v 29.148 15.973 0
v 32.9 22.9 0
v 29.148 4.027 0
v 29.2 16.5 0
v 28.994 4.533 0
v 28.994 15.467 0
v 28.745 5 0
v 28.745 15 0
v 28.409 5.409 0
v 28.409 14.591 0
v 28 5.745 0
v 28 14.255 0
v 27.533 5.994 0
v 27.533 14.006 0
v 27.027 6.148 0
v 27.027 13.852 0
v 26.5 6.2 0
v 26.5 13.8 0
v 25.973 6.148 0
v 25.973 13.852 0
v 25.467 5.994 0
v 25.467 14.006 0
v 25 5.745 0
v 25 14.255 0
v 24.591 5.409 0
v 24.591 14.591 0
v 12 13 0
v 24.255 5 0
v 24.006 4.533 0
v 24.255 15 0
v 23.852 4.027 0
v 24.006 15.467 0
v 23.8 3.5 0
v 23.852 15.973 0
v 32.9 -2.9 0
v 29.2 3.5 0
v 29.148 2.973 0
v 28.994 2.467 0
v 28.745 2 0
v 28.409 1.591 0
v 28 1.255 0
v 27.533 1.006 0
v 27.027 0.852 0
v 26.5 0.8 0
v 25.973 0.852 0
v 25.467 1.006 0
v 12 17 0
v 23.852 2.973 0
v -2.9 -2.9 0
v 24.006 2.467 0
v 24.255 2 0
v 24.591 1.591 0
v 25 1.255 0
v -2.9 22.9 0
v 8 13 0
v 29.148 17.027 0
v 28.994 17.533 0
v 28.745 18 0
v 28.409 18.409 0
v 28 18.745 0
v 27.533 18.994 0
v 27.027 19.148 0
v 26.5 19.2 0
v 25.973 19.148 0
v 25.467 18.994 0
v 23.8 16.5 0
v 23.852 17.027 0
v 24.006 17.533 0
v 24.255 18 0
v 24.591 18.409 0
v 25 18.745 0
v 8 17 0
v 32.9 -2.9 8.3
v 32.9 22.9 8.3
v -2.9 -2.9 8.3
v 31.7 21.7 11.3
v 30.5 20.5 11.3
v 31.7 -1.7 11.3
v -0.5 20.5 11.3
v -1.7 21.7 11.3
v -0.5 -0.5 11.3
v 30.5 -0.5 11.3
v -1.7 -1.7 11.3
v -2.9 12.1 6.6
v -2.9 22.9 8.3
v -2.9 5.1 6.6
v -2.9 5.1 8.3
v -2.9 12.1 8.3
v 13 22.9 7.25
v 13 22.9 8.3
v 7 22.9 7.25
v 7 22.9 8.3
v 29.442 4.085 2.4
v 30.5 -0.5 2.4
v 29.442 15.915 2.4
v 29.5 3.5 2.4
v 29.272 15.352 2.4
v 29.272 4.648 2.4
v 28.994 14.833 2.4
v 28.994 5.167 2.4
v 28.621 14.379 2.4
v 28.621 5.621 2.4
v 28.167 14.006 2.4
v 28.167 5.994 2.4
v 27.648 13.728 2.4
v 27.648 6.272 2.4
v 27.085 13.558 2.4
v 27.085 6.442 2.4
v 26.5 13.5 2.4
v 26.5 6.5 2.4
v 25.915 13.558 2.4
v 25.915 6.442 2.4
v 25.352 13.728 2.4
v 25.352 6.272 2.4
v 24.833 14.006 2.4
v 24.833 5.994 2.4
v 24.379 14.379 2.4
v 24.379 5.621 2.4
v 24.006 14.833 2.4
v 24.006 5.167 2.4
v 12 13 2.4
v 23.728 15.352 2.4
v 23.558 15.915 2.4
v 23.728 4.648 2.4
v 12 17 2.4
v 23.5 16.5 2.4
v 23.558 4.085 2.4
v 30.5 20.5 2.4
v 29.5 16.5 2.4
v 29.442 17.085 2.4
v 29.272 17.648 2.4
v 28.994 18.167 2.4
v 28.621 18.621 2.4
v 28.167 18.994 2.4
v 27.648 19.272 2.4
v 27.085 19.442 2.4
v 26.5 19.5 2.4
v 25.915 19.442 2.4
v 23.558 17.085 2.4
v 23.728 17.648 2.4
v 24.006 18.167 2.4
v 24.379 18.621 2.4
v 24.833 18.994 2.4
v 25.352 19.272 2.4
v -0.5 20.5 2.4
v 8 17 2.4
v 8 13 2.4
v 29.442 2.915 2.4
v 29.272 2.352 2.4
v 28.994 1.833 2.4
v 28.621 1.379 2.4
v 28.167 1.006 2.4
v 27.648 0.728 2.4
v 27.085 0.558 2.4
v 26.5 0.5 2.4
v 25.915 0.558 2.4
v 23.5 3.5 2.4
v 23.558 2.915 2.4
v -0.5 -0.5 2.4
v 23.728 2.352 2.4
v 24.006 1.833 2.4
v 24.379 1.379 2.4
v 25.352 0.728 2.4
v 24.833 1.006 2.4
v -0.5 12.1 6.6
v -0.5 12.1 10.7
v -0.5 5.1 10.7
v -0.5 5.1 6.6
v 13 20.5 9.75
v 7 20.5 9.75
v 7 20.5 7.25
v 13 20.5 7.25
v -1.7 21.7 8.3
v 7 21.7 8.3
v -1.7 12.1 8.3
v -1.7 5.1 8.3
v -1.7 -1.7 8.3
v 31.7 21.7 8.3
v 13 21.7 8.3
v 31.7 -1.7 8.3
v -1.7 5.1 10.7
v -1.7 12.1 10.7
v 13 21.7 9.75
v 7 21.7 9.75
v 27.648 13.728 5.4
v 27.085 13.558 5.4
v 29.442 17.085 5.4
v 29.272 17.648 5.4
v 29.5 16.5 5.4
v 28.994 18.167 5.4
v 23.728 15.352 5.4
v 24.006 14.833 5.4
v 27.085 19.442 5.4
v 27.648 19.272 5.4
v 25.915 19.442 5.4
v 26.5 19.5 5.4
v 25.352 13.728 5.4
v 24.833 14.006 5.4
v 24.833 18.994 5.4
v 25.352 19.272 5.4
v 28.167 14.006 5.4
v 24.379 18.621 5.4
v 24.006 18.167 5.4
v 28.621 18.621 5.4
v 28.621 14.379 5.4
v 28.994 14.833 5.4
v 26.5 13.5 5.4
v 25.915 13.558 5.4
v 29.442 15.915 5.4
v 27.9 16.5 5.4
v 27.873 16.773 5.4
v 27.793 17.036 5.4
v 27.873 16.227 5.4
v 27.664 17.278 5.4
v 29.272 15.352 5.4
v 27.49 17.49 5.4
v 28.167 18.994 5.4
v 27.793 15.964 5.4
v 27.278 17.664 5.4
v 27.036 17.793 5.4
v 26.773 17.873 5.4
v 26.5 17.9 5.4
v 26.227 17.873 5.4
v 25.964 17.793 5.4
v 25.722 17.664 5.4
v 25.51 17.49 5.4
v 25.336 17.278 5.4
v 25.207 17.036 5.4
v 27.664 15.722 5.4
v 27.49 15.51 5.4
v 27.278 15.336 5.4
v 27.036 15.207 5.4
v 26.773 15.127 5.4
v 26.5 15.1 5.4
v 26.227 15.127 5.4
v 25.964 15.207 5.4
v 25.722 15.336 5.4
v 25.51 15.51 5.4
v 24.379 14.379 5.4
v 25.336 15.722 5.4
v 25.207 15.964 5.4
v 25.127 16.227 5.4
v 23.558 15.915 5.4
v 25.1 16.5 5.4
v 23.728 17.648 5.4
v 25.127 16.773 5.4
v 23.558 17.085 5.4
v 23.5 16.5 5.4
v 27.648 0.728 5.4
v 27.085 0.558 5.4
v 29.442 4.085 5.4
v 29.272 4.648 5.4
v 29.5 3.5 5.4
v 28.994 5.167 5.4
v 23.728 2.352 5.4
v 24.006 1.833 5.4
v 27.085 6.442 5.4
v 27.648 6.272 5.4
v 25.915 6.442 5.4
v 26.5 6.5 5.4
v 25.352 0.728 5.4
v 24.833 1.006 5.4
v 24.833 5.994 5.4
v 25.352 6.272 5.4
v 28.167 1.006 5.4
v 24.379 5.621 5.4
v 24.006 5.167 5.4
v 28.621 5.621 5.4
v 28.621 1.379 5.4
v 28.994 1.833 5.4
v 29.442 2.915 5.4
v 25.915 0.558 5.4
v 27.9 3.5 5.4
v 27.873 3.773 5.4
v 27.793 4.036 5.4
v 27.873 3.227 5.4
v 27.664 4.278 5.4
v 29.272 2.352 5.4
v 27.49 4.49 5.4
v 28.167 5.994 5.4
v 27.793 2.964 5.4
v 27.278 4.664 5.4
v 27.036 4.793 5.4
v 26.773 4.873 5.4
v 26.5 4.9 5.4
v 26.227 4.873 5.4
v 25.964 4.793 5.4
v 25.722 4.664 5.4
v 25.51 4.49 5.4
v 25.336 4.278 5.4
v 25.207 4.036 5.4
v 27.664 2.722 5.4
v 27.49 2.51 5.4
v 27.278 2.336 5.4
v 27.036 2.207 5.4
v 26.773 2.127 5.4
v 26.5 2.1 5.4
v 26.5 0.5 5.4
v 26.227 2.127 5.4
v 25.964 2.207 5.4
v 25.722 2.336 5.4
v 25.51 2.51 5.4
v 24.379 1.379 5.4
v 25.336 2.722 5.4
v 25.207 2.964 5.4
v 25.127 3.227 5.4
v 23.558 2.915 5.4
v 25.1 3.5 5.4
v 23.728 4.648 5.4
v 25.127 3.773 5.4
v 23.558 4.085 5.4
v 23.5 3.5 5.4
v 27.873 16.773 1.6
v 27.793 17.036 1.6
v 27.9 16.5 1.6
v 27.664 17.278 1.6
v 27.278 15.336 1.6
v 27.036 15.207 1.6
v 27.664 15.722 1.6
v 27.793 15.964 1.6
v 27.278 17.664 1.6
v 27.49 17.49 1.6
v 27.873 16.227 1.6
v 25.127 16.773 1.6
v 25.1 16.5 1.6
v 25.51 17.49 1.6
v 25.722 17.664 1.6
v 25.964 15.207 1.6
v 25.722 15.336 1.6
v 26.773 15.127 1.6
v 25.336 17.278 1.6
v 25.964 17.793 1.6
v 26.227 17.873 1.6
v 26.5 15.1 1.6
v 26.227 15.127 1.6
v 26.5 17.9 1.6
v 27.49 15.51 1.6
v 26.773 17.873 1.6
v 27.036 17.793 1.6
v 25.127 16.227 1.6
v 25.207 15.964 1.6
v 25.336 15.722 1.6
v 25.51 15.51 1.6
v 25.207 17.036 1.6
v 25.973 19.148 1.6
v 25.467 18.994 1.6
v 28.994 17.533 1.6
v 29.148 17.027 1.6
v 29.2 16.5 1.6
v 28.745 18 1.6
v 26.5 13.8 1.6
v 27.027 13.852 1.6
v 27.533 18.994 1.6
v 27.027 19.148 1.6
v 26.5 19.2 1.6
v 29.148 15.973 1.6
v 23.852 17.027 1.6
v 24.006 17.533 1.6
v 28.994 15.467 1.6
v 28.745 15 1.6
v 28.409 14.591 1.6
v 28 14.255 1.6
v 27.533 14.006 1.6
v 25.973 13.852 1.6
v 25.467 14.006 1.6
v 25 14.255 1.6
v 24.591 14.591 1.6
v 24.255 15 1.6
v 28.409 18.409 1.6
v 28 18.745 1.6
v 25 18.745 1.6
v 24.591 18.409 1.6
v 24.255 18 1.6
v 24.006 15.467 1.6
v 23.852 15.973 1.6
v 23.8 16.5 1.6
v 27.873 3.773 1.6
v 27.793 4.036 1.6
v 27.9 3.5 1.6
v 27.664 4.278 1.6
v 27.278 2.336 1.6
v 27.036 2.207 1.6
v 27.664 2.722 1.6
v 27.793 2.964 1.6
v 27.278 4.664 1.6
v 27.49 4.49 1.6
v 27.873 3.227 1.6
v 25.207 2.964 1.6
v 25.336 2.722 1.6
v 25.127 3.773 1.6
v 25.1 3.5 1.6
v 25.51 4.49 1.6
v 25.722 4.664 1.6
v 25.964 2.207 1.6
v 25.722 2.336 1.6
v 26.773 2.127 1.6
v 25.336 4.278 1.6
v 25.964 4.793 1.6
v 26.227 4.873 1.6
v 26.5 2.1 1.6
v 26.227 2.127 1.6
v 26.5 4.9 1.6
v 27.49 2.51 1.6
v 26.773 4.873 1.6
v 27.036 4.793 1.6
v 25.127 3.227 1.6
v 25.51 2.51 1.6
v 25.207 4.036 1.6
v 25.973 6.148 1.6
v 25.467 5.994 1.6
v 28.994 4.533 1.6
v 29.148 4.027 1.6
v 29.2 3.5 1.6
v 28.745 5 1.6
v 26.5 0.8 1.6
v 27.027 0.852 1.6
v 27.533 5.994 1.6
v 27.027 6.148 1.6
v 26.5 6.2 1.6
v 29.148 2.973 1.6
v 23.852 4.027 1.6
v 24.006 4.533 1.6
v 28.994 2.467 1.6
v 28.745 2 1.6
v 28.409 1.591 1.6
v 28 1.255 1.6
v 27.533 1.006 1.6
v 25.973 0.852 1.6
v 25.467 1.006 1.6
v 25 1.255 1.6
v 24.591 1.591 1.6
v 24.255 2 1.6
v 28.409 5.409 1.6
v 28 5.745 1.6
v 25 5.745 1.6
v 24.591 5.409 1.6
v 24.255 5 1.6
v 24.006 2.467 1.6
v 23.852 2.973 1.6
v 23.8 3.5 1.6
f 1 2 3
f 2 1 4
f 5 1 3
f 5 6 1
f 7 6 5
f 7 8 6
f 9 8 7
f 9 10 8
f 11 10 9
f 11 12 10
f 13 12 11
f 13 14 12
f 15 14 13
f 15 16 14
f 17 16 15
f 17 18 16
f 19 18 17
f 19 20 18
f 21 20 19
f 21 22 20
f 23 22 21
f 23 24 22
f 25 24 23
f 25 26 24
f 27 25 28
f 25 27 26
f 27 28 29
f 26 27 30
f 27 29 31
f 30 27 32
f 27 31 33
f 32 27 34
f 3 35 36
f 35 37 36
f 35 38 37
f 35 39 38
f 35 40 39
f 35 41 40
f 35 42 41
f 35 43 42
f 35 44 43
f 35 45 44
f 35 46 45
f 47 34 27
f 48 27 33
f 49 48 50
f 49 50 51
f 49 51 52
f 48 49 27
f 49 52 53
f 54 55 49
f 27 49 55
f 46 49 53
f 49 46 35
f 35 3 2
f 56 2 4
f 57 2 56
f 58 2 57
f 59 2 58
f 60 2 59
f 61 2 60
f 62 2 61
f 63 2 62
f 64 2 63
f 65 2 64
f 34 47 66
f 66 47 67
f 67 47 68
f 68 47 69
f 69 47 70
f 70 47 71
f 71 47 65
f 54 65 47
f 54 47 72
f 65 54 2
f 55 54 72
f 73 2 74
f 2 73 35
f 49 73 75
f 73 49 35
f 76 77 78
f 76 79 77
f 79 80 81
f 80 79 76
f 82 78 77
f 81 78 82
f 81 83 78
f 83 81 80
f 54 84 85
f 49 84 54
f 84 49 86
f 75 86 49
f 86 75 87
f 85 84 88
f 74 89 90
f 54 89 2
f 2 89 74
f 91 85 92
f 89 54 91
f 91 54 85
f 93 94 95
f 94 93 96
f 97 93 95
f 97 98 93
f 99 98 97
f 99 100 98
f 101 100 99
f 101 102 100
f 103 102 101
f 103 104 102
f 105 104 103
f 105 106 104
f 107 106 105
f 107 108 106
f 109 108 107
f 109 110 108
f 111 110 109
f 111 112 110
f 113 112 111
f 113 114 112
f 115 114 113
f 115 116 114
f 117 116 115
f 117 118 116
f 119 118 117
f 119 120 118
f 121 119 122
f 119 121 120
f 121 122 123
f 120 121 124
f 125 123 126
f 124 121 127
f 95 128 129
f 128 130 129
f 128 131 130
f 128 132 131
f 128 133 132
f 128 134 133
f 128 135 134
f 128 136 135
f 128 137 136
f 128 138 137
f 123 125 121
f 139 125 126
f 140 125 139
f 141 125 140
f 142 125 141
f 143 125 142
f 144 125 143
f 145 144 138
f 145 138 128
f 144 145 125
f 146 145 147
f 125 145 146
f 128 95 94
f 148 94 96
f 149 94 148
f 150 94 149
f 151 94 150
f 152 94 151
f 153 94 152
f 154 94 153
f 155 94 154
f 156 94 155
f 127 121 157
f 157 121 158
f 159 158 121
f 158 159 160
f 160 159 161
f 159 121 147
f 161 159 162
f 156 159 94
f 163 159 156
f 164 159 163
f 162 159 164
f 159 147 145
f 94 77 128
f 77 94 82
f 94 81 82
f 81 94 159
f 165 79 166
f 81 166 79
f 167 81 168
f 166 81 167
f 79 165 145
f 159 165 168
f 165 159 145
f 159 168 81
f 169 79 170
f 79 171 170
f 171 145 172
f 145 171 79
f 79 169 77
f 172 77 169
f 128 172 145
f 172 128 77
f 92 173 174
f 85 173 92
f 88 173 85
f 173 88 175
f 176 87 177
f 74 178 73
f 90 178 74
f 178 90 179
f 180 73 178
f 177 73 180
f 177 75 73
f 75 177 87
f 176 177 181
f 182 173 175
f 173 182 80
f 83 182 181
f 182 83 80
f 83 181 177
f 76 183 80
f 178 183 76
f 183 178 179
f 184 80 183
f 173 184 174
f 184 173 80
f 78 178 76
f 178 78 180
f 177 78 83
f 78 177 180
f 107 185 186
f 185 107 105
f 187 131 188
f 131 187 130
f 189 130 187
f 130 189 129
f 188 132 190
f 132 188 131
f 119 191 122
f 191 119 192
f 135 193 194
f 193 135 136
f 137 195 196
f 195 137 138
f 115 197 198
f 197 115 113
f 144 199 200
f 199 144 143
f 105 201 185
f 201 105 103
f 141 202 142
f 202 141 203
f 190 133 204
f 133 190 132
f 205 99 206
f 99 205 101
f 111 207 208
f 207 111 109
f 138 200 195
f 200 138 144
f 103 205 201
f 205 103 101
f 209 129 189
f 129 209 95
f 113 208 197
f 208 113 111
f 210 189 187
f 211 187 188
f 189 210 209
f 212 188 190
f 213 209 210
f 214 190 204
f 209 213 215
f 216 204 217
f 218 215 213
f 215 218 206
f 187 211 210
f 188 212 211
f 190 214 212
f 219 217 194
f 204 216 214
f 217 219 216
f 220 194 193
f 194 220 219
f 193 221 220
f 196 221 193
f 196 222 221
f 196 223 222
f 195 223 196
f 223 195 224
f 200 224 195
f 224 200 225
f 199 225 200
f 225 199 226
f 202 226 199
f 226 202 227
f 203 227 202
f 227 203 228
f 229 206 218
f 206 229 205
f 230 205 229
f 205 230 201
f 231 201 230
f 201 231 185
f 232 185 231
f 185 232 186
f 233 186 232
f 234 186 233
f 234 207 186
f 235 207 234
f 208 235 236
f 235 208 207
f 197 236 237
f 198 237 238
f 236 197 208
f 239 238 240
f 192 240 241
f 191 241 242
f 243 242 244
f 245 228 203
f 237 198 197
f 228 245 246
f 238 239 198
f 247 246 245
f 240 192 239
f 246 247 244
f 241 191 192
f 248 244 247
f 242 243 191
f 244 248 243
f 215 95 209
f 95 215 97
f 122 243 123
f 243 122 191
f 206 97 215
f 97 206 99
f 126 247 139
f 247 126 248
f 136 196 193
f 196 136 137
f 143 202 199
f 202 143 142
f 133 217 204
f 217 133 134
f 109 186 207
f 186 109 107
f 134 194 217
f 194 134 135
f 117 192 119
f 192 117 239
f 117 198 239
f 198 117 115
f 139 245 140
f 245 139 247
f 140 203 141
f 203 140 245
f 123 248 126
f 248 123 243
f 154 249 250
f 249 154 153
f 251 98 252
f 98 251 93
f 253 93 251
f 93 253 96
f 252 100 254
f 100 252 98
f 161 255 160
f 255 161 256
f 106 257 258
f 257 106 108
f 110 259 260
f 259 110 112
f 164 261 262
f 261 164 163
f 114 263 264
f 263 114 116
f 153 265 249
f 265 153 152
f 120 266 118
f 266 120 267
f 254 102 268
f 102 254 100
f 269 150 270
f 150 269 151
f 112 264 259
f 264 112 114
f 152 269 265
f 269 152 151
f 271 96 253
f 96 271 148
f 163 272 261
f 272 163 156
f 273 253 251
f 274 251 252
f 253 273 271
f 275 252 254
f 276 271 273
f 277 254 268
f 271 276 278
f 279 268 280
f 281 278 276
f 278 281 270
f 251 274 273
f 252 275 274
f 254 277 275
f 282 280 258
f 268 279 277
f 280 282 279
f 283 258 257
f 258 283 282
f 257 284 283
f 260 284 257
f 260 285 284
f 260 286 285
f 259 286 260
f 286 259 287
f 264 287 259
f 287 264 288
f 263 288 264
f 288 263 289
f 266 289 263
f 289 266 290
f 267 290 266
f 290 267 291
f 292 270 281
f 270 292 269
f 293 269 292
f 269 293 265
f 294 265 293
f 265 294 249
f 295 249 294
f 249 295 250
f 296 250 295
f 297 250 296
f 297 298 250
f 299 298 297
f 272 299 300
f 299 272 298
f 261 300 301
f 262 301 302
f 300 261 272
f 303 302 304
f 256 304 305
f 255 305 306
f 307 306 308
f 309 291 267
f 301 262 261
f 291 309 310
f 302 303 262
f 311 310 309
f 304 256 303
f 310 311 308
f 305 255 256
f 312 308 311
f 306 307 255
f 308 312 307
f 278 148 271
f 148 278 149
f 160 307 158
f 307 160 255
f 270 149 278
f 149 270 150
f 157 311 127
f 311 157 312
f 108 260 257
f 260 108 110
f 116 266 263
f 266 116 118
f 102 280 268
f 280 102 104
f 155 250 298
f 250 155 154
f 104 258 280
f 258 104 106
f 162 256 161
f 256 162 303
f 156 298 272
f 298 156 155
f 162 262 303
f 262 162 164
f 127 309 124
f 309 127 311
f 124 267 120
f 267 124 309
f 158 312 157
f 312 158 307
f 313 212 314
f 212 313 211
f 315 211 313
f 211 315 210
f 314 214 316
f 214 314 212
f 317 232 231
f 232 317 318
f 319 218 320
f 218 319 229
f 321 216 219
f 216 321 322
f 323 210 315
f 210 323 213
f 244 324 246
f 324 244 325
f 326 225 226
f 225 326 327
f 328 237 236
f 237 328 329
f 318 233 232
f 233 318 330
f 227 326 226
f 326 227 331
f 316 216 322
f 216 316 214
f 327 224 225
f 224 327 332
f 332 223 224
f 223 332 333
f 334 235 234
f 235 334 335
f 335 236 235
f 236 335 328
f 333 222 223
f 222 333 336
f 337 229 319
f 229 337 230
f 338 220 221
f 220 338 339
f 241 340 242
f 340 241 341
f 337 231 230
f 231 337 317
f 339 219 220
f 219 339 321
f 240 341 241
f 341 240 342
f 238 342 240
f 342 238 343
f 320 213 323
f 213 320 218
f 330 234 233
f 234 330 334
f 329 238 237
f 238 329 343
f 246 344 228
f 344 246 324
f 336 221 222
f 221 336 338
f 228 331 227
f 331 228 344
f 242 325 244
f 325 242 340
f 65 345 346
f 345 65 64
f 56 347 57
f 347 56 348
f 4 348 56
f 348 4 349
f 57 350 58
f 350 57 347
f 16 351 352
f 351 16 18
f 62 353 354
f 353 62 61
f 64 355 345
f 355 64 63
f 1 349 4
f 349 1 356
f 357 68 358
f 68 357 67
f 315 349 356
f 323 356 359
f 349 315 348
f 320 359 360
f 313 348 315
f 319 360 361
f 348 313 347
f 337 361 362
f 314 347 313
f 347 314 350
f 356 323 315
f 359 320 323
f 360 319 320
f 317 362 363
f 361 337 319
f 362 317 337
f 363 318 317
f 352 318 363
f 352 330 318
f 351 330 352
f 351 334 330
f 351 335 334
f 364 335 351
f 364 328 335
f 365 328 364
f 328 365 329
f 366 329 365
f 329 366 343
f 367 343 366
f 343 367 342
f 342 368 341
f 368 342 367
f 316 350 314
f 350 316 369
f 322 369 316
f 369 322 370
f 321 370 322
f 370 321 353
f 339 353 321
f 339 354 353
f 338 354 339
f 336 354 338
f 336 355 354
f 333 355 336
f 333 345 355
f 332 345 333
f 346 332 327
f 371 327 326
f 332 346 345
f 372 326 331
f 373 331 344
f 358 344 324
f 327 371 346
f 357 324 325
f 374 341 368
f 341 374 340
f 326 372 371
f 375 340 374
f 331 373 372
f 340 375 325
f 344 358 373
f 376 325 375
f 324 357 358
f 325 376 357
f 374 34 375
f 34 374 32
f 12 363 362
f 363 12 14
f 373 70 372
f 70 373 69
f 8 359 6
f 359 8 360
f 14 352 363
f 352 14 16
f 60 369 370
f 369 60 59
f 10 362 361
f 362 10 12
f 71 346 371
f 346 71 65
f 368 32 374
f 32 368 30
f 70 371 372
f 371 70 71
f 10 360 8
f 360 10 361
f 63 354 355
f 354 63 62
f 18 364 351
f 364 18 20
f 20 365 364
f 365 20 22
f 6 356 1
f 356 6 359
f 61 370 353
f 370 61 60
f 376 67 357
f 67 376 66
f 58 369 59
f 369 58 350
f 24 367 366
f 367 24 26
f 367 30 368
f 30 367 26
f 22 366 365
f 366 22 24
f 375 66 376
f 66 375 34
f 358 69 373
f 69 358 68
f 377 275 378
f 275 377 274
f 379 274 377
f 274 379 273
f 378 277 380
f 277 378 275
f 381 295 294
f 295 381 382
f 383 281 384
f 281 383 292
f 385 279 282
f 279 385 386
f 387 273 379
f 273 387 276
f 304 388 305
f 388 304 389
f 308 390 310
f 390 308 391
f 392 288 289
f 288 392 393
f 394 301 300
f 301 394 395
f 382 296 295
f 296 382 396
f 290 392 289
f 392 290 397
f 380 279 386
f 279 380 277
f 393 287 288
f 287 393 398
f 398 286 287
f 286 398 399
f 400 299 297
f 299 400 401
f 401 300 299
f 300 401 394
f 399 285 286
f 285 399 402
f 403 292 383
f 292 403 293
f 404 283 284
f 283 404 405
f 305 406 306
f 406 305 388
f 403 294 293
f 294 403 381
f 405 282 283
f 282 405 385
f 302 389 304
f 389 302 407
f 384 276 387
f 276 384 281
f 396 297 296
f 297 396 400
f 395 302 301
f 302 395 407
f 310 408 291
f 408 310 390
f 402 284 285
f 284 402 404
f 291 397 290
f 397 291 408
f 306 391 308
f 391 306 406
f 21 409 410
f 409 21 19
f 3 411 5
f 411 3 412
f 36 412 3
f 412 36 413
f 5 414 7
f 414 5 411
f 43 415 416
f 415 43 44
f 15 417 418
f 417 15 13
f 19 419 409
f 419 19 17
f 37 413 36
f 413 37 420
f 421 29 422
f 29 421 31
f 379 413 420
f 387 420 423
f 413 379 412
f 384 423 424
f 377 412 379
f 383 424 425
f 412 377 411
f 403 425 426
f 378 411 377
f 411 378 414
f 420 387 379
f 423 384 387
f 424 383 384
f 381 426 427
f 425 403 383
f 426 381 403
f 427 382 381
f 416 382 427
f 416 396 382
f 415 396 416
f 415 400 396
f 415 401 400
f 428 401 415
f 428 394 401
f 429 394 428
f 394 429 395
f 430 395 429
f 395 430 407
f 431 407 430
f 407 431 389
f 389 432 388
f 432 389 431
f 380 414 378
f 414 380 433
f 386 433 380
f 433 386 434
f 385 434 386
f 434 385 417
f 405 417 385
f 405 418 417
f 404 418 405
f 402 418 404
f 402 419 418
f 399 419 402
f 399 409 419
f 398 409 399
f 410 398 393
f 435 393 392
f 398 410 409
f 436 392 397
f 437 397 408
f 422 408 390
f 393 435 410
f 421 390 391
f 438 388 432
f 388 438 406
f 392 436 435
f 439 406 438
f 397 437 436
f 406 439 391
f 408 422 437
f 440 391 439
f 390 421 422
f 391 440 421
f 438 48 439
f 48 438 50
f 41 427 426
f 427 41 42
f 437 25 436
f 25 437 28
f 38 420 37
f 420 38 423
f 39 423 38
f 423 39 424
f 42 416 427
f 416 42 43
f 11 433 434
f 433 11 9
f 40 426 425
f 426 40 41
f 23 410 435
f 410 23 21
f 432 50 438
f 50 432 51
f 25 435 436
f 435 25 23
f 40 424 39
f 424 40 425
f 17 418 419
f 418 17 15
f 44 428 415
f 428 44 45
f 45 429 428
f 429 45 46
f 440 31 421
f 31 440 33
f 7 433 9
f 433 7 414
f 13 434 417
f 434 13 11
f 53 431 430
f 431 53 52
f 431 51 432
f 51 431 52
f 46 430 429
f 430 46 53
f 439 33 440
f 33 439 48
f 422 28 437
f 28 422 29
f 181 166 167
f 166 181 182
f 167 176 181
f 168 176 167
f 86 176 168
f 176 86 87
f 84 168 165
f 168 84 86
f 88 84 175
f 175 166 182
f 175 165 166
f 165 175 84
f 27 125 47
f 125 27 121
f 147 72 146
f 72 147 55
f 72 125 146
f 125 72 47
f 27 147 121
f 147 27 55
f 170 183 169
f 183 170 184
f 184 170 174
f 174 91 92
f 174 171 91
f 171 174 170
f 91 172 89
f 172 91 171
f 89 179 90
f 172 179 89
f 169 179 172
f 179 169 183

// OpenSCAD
// The base of the housing "usbc_parts", written by enclosure-nv 0.1.0
// from the board file usbc_board.kicad_pcb.  Render with OpenSCAD.
// Parameters, in millimetres.  The same block heads every file of this housing:
// when a value is changed, change it in each file.
wall = 2.4;
floor_t = 2.4;
lid_t = 1.6;
clear = 0.5;  // the board's edge to the inside of the wall
standoff_d = 6;
screw_d = 2.5;
pilot_d = 2.1;
head_d = 5;
head_h = 1.6;
lip_h = 3;  // the height of the step the lid sits on
lid_gap = 0.2;
snap_depth = 0.4;
snap_h = 0.8;
led_d = 3;
button_d = 3;
board_t = 1.6;
standoff_h = 3;  // the space under the board
top_space = 4.3;  // the space above the board
pilot_len = 3.5;  // the depth of the screw's hole
print_flip = false;  // true lays the lid plate down

// Levels along z.
z_bb = floor_t + standoff_h;
z_bt = z_bb + board_t;
z_split = z_bt + top_space;
z_step = z_split - lip_h;
z_top = z_split + lid_t;
z_skirt = z_step + lid_gap;
a_in = wall / 2;
screw_clear = screw_d + 0.3;

module outline() {
  polygon(points = [[0, 0], [30, 0], [30, 20], [0, 20]]);
}

module base() {
  difference() {
    union() {
      difference() {
        linear_extrude(height = z_split) offset(delta = clear + wall) outline();
        translate([0, 0, floor_t]) linear_extrude(height = z_split) offset(delta = clear) outline();
        translate([0, 0, z_step]) linear_extrude(height = z_split) difference() {
          offset(delta = clear + wall + 1) outline();
          offset(delta = clear + a_in) outline();
        }
      }
      // the standoffs
      translate([26.5, 16.5, floor_t / 2]) cylinder(h = z_bb - floor_t / 2, d = standoff_d, $fn = 32);
      translate([26.5, 3.5, floor_t / 2]) cylinder(h = z_bb - floor_t / 2, d = standoff_d, $fn = 32);
    }
    // the screw holes, through the standoff and the floor, with a recess for the head
    translate([26.5, 16.5, -1]) cylinder(h = z_bb + 2, d = screw_clear, $fn = 32);
    translate([26.5, 16.5, -1]) cylinder(h = head_h + 1, d = head_d + 0.4, $fn = 32);
    translate([26.5, 3.5, -1]) cylinder(h = z_bb + 2, d = screw_clear, $fn = 32);
    translate([26.5, 3.5, -1]) cylinder(h = head_h + 1, d = head_d + 0.4, $fn = 32);
    // the openings
    translate([0, 8.6, z_bt + (-0.4)]) rotate([0, 0, 180]) translate([-1, -3.5, 0]) cube([clear + wall + 2, 7, 4.1]);
    translate([8, 13, -1]) cube([4, 4, floor_t + 2]);
    translate([10, 20, z_bt + (0.25)]) rotate([0, 0, 90]) translate([-1, -3, 0]) cube([clear + wall + 2, 6, 2.5]);
  }
}

base();
